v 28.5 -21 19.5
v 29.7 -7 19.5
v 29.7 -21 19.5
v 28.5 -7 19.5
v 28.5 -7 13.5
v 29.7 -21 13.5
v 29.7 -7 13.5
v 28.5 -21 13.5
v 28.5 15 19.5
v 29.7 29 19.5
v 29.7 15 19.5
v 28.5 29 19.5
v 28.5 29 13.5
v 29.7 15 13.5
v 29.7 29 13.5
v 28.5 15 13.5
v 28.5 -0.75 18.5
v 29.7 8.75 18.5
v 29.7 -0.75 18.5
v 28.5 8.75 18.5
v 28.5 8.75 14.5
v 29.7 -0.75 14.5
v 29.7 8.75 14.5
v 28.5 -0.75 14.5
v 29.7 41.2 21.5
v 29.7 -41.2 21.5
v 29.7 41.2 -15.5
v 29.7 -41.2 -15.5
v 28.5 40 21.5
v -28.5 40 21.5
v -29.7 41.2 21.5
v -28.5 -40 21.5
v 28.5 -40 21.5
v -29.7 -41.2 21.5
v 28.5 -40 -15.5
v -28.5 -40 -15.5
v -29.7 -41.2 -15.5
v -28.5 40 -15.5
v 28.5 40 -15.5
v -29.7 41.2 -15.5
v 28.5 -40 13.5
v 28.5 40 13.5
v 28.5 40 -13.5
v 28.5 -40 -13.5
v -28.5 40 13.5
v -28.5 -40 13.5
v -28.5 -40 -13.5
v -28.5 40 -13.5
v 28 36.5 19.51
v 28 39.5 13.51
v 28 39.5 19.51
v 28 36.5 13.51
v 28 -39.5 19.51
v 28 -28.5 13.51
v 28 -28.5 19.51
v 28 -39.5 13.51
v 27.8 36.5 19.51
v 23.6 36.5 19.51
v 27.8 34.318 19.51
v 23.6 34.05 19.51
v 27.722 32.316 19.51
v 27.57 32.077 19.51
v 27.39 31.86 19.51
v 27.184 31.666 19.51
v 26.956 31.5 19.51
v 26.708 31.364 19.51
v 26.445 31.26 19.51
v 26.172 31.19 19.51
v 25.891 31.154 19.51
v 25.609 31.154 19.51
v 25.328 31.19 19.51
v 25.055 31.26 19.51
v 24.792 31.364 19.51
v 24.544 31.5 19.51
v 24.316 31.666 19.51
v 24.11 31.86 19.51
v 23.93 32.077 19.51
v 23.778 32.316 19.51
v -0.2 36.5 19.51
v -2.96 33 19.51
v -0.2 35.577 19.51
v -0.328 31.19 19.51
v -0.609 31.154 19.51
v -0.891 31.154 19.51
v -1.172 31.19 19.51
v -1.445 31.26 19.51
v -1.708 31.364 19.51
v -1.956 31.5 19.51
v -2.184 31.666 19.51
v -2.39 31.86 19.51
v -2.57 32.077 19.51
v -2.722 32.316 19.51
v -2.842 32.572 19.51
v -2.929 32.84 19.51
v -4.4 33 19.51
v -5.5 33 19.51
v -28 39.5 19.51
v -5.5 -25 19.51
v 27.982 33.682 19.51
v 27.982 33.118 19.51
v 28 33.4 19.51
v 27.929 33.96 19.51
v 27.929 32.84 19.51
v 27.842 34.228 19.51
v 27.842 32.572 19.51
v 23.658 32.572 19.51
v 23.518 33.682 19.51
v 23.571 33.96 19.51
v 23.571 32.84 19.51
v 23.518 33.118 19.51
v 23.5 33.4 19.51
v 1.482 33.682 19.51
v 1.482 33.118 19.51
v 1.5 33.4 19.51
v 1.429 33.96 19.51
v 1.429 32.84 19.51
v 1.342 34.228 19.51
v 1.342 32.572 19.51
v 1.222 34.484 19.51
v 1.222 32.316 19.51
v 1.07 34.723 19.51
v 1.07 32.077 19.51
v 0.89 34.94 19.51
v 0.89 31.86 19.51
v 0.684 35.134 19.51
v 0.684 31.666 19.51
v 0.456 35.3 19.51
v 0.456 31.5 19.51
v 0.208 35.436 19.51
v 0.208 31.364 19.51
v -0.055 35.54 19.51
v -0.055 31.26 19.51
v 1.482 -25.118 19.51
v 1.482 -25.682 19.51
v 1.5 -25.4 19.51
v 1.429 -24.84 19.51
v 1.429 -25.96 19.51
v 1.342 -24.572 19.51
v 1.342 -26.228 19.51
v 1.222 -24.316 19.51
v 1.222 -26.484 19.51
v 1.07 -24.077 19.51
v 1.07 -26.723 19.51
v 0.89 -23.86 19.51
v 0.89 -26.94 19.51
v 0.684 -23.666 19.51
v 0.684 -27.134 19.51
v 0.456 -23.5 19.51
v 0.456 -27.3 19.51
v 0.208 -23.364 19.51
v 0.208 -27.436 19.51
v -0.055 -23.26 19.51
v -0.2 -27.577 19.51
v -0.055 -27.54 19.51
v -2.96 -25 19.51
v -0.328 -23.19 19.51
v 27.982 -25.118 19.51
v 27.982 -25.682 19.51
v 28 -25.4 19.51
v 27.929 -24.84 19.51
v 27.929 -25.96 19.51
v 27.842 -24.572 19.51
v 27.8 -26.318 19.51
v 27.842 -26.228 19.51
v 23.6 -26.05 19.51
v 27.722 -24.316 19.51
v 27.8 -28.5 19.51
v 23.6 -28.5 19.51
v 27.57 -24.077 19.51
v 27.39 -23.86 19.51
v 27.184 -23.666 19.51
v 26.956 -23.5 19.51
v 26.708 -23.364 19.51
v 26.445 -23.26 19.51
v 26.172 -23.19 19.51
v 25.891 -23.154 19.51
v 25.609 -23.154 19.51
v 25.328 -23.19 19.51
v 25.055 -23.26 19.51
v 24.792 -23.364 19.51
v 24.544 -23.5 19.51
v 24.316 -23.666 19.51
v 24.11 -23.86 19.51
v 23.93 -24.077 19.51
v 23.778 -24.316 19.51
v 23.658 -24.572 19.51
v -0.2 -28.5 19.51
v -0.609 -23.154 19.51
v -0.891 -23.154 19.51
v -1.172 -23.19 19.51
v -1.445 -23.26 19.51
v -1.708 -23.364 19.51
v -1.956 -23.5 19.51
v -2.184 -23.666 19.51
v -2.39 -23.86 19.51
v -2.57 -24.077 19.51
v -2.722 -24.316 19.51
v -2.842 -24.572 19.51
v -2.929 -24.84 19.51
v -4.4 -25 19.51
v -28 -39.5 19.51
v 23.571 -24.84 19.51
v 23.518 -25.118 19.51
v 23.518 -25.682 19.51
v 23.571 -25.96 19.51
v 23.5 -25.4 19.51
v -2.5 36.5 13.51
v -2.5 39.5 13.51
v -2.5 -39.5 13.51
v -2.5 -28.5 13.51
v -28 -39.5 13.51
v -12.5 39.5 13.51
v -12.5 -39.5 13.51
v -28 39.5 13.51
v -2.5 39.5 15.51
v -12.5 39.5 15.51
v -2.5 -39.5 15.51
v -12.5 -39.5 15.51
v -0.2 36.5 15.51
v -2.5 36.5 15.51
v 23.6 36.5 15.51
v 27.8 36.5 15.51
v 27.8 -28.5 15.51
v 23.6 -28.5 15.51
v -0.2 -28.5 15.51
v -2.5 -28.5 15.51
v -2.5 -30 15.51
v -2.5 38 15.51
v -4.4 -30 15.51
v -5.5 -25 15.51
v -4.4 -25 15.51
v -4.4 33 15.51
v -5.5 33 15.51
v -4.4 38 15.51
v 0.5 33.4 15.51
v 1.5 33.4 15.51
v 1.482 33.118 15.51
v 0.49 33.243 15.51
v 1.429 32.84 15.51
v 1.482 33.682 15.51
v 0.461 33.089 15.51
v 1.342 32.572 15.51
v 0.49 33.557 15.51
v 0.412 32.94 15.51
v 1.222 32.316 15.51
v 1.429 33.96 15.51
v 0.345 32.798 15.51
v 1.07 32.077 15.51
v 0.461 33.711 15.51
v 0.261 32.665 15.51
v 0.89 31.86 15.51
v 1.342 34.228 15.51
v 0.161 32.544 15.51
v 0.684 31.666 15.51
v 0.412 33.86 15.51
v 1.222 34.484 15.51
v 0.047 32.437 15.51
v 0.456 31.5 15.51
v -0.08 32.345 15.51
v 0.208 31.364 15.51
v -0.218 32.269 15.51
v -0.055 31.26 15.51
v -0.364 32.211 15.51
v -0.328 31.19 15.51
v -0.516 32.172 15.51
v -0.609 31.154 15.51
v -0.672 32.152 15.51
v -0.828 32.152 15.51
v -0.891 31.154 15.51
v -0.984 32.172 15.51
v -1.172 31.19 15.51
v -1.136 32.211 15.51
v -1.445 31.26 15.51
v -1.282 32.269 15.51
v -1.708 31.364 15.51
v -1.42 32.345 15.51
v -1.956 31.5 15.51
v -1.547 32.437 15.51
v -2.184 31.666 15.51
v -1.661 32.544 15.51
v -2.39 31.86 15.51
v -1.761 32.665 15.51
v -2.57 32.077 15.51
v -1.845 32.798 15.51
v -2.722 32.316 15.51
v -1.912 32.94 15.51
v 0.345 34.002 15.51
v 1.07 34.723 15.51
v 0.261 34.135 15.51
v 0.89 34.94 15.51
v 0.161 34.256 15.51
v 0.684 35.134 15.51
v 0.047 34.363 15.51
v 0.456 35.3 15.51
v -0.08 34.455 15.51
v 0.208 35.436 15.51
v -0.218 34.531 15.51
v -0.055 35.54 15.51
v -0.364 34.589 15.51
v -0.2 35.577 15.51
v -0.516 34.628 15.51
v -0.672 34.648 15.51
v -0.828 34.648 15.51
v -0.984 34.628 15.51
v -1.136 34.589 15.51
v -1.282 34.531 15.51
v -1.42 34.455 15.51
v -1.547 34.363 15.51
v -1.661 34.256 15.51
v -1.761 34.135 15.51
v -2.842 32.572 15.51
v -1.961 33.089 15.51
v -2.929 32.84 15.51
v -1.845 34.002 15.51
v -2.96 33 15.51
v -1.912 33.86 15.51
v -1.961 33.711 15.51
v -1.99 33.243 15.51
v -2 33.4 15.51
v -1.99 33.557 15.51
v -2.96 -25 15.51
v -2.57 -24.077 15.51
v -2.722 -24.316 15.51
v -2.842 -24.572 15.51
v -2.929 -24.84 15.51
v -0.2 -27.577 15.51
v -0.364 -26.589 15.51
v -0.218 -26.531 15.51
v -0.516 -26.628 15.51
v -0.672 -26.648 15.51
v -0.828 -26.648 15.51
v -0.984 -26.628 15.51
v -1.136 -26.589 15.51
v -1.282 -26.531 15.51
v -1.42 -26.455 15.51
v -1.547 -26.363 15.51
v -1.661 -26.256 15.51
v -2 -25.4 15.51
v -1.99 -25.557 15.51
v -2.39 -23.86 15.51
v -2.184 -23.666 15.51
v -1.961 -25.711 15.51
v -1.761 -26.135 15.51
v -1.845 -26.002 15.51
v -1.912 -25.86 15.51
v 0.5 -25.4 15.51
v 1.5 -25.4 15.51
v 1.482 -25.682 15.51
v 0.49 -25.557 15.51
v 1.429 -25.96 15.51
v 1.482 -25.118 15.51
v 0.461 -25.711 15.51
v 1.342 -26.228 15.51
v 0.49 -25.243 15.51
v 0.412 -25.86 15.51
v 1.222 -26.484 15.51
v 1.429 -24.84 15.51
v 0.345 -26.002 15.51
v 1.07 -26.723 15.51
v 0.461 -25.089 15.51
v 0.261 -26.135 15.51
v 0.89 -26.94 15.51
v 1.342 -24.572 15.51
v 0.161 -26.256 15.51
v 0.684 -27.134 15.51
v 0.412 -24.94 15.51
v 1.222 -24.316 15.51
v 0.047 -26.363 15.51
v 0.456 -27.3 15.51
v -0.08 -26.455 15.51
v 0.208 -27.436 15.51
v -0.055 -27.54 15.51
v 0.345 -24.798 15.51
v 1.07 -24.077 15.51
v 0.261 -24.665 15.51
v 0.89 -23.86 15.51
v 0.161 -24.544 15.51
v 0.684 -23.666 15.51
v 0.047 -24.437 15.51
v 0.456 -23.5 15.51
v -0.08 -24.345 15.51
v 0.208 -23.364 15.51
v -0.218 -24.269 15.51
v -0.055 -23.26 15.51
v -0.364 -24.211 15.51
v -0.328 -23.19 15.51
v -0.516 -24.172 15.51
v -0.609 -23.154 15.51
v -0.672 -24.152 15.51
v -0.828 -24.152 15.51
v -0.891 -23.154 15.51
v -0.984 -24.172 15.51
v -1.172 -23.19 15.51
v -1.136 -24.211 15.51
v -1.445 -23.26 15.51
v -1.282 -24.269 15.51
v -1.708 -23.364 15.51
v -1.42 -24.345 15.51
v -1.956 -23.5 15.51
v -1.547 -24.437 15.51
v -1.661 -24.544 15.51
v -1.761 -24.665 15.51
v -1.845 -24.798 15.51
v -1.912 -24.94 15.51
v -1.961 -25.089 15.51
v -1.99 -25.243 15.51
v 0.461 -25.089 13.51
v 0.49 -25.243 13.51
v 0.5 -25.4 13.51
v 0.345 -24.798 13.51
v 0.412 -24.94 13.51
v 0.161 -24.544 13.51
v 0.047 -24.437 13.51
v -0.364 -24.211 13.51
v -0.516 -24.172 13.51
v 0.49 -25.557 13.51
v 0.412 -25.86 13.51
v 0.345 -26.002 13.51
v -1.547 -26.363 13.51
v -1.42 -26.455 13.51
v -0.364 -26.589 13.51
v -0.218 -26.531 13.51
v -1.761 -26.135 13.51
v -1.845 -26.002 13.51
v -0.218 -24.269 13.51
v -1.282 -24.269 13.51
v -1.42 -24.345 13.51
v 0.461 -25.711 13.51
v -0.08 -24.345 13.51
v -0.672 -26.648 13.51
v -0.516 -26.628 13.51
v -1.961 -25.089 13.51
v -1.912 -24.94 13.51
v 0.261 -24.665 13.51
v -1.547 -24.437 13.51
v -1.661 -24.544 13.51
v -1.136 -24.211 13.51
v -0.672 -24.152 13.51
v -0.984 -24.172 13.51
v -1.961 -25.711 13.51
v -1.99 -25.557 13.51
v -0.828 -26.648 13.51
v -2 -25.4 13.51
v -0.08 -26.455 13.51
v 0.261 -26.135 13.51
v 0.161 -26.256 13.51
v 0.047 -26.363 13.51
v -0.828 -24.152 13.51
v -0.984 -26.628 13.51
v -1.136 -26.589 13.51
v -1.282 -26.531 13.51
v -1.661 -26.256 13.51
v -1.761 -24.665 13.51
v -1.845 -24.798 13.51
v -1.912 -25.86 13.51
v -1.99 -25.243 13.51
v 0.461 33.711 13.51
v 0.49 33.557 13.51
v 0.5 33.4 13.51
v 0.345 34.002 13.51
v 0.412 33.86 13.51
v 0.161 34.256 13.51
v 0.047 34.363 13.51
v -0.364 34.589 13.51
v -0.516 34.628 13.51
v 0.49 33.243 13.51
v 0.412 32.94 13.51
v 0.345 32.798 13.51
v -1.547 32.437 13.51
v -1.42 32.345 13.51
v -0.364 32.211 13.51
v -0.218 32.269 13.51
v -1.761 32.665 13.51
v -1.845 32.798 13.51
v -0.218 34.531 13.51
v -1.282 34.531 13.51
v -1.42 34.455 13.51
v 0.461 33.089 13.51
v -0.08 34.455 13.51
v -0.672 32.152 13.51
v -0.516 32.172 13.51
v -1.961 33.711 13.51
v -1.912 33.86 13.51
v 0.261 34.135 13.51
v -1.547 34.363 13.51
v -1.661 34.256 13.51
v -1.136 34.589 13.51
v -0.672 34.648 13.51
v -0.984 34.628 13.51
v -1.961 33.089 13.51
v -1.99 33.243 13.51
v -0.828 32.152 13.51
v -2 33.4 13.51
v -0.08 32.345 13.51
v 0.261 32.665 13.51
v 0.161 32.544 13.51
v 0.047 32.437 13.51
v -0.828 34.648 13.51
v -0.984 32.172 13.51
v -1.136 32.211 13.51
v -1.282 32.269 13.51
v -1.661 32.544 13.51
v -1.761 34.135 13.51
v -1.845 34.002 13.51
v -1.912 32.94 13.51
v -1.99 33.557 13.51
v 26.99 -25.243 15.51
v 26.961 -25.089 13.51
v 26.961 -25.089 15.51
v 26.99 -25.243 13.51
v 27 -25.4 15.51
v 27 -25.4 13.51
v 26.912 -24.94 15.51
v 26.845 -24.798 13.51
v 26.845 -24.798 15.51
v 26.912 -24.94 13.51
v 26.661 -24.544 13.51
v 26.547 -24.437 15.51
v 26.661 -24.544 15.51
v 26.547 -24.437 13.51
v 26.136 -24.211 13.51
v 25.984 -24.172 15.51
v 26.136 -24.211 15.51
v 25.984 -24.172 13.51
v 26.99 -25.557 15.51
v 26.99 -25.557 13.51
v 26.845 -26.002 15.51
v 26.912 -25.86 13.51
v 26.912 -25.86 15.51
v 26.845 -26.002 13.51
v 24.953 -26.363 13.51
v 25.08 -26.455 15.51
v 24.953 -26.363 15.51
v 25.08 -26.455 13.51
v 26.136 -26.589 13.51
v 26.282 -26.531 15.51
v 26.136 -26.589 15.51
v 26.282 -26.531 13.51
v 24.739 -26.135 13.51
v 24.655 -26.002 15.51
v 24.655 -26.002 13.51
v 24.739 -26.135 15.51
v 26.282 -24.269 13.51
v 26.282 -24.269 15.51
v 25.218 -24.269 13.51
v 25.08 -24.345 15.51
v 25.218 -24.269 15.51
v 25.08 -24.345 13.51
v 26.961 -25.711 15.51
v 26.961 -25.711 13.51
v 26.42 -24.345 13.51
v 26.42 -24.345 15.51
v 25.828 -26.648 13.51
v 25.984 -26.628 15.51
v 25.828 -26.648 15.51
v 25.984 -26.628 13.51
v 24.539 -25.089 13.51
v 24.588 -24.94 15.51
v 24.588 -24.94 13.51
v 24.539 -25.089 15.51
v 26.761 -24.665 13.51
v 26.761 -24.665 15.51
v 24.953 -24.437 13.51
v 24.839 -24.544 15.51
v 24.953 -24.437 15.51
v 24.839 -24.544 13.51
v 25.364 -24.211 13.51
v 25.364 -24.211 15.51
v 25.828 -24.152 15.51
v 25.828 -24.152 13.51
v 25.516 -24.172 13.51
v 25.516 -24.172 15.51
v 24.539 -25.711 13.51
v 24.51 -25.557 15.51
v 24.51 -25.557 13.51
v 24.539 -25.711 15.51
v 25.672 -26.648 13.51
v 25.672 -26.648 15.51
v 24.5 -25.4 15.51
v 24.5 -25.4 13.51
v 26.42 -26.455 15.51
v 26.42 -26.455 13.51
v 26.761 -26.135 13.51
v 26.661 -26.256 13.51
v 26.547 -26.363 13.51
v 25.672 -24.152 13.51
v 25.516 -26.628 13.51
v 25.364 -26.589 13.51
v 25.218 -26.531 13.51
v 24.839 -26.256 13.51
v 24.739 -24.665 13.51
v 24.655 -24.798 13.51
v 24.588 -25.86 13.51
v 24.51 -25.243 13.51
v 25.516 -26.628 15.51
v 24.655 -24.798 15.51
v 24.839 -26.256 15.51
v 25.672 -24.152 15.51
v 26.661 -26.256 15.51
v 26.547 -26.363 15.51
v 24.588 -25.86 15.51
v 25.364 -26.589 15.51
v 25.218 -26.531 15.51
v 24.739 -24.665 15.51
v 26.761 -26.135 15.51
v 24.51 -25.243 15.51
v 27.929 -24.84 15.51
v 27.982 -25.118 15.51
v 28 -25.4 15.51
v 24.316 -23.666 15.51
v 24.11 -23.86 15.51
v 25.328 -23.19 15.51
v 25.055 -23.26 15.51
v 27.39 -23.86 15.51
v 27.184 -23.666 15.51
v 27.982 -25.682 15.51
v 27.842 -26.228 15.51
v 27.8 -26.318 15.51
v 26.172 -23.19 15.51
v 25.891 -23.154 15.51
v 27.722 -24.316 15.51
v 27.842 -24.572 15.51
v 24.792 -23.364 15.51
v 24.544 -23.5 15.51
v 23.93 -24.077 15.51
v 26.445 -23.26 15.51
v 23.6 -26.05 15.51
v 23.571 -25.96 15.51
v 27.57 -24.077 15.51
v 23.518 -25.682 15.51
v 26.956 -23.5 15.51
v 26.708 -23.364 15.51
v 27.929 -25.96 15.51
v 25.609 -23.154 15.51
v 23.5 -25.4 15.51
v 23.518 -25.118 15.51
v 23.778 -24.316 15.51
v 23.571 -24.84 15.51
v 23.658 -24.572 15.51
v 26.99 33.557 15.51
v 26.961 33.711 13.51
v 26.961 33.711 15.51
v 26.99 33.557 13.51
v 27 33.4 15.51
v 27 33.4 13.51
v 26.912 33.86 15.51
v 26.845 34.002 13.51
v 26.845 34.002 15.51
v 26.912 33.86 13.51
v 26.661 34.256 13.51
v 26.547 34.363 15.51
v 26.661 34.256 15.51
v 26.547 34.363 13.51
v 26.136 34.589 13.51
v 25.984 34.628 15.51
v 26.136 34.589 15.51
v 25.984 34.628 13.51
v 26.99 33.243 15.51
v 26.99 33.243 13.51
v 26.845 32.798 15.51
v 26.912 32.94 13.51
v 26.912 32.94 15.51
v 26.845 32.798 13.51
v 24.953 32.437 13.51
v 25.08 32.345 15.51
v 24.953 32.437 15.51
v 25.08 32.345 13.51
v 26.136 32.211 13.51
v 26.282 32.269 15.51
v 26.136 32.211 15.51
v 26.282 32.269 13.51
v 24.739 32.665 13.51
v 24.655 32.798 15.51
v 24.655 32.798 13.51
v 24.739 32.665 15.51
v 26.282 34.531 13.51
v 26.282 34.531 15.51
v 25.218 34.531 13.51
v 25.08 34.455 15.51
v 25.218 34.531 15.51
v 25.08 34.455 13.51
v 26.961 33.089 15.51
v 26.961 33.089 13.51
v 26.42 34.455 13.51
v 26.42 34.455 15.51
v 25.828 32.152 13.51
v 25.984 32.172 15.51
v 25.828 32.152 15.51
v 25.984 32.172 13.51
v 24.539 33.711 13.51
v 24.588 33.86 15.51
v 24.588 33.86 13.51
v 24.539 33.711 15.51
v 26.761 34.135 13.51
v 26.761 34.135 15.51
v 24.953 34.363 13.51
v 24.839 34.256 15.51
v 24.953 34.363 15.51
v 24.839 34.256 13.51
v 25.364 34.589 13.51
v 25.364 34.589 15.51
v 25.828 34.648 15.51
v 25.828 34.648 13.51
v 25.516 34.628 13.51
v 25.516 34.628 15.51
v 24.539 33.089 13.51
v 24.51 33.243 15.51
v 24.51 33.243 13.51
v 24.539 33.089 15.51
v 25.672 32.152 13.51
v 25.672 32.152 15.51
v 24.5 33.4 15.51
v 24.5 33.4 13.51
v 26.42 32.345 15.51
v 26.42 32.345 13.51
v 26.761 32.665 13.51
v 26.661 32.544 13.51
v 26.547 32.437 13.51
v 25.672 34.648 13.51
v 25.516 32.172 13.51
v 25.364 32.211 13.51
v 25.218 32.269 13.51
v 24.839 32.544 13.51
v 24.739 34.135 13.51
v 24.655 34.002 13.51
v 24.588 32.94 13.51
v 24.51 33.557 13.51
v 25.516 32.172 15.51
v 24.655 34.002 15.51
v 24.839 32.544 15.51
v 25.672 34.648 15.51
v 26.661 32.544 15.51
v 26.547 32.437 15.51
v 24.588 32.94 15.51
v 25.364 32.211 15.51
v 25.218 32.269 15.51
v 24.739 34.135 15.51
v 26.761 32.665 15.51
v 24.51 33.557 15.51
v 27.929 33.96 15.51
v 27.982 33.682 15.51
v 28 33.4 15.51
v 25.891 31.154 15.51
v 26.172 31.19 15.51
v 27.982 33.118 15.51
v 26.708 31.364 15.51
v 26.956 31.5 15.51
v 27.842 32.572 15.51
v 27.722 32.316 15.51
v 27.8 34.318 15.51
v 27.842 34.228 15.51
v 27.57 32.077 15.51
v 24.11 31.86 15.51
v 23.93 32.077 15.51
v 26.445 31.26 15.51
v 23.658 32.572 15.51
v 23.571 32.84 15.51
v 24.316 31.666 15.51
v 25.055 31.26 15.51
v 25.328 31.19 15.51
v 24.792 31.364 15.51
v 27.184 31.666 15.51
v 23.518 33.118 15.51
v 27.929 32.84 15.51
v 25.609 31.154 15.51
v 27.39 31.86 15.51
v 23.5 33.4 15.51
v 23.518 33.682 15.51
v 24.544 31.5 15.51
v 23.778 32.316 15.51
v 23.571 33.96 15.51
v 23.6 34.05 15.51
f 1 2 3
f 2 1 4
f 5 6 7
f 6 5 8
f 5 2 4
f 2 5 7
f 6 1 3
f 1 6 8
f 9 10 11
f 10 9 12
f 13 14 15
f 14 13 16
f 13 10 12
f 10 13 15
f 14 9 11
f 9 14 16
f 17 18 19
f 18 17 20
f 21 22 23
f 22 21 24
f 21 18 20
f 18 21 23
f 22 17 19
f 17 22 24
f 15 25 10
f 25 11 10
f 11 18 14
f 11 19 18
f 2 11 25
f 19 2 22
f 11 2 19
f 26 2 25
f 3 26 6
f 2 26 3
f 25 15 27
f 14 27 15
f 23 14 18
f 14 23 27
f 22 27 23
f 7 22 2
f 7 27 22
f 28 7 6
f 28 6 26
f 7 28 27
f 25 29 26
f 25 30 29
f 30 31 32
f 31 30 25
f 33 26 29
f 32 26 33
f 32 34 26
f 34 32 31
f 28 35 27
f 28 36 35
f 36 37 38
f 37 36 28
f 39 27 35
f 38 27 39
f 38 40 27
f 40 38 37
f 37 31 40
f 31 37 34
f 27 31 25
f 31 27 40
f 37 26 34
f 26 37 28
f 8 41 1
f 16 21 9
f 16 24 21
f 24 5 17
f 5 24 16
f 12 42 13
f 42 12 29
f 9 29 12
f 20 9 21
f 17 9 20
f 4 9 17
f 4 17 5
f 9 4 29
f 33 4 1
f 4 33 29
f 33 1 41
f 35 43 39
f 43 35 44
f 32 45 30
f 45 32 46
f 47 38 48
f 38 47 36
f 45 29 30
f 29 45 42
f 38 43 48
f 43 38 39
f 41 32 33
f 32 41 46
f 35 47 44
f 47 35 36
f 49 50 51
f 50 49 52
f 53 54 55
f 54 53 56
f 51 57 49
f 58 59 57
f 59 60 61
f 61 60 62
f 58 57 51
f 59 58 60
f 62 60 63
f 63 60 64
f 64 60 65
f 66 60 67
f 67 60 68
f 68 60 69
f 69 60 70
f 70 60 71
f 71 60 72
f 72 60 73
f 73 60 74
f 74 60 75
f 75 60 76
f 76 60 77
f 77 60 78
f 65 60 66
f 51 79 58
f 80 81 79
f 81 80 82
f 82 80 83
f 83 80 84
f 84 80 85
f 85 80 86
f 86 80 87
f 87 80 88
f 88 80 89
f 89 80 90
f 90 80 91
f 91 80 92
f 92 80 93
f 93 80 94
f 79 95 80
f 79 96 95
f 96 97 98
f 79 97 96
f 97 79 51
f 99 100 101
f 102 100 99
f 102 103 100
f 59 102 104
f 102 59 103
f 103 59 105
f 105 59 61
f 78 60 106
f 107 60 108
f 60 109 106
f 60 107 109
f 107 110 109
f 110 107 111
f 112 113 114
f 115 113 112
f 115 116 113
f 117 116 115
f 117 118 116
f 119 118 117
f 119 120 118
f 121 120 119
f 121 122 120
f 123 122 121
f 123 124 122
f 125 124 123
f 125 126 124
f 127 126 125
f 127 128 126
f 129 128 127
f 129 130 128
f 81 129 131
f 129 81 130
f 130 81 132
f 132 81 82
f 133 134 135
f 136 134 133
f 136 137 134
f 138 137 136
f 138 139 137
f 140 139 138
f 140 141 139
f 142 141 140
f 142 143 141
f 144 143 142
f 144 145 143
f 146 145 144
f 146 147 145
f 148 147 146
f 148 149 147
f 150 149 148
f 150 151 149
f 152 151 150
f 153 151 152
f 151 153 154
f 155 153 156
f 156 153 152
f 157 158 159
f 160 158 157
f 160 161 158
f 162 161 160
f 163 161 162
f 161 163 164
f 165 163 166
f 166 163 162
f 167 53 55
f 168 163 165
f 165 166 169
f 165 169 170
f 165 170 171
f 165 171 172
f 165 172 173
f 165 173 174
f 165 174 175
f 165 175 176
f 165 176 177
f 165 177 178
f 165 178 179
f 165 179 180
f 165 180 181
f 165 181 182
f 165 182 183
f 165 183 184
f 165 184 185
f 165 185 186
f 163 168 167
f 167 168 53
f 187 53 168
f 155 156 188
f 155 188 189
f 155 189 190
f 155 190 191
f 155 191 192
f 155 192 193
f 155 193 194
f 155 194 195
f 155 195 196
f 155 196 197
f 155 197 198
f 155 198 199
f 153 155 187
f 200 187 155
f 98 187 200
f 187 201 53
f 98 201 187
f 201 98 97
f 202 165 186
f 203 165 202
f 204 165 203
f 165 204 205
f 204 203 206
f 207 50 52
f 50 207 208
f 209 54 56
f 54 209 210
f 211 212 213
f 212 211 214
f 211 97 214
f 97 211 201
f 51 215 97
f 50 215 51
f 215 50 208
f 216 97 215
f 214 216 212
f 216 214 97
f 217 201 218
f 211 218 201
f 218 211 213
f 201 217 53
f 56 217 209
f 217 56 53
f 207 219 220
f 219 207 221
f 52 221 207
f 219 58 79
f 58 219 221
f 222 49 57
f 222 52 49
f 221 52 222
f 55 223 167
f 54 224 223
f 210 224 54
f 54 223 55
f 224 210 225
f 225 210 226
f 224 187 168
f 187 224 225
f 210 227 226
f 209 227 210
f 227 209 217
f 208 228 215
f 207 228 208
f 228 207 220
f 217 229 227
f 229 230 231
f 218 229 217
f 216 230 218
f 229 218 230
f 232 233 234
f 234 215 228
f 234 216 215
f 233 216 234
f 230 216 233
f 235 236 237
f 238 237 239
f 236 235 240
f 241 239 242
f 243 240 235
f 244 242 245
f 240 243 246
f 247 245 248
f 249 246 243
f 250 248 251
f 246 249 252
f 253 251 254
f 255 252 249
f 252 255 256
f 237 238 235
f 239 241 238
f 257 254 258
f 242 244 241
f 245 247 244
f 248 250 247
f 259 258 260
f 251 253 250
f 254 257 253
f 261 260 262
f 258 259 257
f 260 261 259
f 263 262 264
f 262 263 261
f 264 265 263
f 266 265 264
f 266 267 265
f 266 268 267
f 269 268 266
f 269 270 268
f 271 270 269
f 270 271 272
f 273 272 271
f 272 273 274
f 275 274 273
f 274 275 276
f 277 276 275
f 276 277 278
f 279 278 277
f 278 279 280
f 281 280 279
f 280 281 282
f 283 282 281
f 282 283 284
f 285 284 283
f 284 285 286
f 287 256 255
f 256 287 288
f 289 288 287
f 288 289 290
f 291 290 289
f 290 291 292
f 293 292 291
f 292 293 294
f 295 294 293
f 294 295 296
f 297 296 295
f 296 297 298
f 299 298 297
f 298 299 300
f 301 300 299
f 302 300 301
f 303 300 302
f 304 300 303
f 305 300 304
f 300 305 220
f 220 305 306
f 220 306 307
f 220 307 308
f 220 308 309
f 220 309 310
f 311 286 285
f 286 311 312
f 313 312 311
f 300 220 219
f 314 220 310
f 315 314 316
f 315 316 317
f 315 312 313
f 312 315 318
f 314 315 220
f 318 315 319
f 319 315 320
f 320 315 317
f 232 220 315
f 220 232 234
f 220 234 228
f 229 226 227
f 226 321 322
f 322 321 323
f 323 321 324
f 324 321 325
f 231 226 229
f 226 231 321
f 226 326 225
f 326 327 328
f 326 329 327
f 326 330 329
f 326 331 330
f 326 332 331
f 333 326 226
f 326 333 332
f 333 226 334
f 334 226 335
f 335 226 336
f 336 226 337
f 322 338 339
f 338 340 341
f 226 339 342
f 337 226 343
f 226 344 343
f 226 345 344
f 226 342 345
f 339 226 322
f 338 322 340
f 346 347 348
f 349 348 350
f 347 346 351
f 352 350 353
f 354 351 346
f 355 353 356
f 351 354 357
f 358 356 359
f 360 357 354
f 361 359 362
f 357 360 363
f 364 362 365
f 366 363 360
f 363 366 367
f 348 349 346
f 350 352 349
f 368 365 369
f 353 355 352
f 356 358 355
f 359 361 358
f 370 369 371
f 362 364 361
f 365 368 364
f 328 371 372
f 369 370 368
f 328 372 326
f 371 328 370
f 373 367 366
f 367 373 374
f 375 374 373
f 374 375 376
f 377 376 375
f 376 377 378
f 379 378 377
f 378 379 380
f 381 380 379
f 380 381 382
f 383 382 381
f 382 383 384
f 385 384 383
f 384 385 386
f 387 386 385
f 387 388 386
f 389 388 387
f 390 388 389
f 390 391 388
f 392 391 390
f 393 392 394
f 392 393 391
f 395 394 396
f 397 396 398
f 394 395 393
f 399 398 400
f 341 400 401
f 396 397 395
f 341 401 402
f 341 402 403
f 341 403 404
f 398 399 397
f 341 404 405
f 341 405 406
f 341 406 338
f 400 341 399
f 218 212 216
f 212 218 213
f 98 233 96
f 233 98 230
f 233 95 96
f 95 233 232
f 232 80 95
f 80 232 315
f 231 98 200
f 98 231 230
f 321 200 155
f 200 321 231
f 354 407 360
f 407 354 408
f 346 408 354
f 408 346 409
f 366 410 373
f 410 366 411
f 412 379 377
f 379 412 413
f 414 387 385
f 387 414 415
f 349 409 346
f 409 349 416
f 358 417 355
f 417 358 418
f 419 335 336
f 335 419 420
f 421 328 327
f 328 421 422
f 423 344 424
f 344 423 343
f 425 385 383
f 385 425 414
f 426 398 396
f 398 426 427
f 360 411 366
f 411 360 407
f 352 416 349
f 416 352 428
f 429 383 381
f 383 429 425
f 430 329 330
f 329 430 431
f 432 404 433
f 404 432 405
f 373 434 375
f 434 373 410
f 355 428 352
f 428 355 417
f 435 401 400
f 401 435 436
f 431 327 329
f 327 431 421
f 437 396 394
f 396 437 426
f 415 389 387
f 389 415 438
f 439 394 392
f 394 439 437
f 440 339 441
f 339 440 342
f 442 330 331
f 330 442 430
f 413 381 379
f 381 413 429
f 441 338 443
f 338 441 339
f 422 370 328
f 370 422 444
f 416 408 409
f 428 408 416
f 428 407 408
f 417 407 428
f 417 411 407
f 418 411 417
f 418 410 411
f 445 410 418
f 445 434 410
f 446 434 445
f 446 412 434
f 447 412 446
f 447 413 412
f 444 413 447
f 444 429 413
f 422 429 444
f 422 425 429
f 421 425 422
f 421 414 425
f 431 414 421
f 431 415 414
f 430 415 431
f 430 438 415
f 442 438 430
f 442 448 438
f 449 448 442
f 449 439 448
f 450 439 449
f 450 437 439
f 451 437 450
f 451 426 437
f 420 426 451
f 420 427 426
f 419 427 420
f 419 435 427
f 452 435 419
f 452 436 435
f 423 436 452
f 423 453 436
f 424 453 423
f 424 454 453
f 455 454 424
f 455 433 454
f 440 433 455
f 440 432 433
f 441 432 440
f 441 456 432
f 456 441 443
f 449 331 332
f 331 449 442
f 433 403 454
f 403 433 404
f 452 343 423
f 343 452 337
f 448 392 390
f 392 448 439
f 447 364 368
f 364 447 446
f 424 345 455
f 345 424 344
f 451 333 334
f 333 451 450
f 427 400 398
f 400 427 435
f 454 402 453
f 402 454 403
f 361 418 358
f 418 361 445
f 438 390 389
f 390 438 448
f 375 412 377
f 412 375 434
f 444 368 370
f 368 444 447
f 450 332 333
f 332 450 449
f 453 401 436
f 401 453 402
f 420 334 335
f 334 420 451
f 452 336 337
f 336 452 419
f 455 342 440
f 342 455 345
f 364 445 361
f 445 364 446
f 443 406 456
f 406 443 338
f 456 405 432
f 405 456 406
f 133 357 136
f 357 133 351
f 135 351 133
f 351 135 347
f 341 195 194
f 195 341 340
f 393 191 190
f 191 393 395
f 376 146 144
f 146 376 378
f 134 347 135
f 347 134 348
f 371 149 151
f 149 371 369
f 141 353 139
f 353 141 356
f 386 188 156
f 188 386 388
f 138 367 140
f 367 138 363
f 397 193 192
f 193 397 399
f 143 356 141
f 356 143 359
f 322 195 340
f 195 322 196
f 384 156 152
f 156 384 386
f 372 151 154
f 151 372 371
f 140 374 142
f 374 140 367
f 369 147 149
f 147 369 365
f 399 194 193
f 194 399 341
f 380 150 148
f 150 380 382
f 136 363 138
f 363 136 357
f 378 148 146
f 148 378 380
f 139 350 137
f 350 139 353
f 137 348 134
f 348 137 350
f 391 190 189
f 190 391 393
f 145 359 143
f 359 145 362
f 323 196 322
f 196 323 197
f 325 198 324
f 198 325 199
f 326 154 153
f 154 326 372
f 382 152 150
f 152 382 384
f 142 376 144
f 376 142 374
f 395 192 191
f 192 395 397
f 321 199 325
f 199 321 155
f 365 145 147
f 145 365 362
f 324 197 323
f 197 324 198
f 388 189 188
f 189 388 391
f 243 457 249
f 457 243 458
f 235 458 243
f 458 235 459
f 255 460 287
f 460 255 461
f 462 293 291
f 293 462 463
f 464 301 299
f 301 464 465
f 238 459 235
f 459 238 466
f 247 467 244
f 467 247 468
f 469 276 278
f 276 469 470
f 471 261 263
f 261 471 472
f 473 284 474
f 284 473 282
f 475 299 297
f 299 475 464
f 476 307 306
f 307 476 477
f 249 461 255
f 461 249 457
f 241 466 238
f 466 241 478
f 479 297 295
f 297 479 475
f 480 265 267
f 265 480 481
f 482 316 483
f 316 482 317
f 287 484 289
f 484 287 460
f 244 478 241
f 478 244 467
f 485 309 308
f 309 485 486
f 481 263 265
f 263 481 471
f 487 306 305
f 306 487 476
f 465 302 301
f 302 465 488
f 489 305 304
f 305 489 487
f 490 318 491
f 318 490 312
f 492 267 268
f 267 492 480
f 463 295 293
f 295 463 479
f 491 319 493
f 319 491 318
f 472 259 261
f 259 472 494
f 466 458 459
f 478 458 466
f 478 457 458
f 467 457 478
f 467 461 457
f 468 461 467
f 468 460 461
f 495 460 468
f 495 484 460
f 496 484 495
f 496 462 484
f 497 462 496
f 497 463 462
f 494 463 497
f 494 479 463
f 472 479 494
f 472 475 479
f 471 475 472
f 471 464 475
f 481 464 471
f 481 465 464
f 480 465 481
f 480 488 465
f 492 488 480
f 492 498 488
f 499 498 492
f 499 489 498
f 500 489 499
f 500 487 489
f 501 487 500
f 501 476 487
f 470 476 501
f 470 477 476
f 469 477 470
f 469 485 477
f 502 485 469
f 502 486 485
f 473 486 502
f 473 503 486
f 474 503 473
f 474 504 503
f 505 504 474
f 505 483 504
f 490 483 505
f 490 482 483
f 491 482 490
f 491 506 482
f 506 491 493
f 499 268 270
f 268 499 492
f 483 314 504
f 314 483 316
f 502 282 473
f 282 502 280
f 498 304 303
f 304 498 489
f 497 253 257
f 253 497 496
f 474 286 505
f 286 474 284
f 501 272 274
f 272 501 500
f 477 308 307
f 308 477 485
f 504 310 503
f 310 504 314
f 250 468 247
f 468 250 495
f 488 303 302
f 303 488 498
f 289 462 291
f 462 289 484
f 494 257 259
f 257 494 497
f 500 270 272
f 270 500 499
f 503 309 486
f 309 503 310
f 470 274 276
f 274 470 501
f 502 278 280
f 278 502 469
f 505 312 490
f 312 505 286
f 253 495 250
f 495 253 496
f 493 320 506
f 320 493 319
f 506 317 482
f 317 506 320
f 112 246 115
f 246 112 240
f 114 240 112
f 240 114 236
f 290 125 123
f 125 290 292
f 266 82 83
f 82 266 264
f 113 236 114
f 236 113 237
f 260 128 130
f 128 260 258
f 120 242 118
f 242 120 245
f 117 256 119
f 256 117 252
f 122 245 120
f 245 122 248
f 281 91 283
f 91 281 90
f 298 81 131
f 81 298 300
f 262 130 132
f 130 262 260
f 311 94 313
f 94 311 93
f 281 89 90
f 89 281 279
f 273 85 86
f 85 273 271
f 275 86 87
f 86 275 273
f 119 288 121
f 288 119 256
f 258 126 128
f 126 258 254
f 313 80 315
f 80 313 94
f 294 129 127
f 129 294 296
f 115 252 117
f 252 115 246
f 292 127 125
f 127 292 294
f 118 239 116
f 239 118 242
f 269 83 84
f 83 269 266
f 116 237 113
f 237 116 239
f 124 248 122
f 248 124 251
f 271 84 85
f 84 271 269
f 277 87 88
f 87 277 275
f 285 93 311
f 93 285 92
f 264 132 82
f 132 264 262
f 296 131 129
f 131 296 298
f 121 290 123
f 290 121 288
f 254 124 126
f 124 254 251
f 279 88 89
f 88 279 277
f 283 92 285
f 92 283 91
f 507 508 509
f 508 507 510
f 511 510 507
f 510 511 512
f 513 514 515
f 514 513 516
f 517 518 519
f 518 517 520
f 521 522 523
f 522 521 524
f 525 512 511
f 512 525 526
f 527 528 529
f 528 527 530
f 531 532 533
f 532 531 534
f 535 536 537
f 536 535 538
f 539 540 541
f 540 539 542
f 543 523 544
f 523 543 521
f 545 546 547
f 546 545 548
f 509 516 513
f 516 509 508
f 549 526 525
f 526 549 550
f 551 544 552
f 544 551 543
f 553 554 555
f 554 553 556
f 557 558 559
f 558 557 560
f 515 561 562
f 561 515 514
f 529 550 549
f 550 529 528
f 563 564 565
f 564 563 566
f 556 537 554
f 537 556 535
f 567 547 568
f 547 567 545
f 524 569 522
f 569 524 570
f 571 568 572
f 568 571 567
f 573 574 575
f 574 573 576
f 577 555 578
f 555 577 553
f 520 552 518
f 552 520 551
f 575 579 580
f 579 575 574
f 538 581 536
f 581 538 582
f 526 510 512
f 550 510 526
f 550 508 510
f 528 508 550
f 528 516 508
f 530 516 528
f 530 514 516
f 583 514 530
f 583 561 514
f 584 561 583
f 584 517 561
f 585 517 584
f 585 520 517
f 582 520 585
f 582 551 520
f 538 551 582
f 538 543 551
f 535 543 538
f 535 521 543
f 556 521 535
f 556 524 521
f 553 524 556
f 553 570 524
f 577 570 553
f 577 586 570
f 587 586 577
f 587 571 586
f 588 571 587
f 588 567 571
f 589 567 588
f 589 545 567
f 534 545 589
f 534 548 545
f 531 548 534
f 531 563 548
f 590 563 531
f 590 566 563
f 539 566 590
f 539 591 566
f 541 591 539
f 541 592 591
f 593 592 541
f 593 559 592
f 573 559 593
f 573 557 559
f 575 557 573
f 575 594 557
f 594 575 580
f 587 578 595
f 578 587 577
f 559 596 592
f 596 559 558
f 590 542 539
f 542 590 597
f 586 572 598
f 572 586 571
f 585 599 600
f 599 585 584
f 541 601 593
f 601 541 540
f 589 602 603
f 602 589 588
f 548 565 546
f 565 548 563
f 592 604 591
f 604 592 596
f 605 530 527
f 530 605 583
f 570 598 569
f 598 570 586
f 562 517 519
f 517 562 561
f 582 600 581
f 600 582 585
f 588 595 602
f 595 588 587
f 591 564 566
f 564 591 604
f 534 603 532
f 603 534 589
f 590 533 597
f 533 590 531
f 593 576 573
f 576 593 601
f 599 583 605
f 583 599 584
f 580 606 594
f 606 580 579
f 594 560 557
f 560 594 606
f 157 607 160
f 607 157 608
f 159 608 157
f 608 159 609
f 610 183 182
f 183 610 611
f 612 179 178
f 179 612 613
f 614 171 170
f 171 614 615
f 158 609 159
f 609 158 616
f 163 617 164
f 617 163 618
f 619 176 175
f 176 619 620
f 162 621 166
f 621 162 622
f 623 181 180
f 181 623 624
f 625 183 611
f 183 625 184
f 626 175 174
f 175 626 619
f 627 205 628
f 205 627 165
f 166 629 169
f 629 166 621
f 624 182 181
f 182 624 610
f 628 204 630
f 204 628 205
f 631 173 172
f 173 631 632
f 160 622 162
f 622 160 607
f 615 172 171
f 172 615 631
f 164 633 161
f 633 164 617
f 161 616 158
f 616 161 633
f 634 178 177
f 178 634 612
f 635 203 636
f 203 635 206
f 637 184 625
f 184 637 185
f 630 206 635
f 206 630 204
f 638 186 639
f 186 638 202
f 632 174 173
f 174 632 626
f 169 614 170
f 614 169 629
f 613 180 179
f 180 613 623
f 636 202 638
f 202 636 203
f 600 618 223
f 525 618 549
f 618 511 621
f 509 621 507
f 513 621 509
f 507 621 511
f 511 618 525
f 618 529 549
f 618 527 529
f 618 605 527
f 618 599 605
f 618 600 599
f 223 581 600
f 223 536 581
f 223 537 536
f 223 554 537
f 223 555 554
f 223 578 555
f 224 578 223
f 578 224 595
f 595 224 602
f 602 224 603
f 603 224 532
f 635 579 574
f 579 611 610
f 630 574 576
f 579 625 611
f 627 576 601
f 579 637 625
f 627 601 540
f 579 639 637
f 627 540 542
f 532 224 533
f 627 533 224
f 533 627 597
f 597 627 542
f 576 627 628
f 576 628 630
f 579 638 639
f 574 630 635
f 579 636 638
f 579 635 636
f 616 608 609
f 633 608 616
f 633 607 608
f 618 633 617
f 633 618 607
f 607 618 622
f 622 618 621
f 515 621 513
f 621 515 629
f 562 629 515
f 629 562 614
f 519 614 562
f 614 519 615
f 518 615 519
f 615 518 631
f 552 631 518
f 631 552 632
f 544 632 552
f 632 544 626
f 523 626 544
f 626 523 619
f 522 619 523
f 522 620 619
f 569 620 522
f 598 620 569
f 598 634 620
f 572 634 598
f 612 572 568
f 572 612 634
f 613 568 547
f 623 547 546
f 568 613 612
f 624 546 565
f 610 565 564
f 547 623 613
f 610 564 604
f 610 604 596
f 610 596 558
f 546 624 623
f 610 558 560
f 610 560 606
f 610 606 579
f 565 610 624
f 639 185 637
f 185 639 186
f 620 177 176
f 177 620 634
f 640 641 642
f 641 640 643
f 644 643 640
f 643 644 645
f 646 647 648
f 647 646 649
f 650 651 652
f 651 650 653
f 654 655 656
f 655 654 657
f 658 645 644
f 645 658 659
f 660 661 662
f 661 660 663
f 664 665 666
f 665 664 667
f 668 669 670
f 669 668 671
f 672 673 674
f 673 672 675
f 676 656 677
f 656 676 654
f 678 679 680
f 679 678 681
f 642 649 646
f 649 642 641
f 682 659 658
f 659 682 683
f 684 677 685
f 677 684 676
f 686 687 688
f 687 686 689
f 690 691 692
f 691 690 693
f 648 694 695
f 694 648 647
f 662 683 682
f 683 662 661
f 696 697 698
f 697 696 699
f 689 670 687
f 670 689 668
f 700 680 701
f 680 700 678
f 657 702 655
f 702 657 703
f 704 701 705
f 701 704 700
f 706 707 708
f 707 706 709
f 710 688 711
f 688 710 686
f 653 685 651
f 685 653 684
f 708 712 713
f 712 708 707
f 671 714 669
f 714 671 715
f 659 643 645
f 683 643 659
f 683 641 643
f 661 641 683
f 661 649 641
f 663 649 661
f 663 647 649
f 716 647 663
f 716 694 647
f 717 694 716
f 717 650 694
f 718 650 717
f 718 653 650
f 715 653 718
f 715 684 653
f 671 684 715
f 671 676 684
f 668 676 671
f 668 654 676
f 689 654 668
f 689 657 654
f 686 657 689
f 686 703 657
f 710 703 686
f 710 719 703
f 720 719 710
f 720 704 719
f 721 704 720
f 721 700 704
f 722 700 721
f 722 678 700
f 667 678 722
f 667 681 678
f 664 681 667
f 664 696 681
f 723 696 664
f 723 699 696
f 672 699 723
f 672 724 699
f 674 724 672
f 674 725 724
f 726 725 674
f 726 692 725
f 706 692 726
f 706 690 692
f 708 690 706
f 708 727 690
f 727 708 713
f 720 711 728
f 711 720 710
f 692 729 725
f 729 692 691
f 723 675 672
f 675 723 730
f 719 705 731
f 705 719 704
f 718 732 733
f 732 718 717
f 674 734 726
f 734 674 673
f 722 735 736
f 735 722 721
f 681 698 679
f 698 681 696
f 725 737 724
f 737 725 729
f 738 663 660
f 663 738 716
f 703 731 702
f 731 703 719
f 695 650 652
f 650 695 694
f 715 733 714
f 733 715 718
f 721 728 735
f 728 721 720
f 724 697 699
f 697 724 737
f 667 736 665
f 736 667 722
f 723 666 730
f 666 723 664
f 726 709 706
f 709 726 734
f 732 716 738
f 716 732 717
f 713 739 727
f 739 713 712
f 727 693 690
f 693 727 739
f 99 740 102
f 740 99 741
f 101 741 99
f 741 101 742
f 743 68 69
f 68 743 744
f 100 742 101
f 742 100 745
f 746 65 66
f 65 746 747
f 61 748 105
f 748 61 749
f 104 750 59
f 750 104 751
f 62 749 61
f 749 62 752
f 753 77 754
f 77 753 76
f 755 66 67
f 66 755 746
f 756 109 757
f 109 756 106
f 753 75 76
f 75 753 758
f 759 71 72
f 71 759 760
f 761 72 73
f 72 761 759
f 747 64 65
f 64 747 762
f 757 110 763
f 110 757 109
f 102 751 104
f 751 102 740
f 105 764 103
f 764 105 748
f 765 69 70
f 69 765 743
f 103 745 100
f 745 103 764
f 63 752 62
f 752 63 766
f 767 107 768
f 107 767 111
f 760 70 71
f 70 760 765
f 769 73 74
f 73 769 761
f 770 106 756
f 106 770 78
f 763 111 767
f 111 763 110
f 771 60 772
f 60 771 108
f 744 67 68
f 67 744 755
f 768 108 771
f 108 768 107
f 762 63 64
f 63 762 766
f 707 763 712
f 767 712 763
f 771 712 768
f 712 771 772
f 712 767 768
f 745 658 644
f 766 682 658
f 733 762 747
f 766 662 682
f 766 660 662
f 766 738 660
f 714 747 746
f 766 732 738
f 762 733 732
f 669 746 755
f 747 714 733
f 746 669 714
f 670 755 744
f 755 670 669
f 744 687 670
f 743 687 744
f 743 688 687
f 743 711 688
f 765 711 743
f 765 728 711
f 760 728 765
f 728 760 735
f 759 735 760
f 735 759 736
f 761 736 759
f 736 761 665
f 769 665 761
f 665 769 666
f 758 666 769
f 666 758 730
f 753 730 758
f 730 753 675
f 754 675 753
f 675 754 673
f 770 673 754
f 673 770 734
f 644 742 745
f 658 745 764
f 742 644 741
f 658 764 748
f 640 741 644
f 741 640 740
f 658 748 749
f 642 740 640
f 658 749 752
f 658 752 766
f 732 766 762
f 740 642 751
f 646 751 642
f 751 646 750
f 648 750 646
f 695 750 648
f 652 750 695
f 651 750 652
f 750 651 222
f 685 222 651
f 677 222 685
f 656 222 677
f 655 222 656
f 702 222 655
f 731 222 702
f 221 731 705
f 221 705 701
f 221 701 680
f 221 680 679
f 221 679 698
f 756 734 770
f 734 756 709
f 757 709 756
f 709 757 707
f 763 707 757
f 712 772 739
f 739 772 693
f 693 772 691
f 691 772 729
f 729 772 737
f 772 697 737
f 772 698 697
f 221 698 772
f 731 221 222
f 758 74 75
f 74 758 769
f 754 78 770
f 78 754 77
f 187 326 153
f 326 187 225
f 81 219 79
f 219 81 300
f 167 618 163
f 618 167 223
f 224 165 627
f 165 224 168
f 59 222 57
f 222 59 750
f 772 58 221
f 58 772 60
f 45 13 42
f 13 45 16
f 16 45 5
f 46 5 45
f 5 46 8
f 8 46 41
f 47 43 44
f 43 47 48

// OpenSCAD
$fn=50;

w_batt = 57;
h_batt = 80;
t_batt = 27;

// Make it a multiple of nozzle size
t_wall = 1.2;

h_lid = 6;

// thickness of the top and bottom denim-lined plates
h_plates = 2;


module corners(w=10, h=5) {
    for (i = [-1, 1])
        for (j = [-1, 1])
            translate([w / 2 * i, h / 2 * j, 0]) children(0);
}


module batt() {
    // color("green") {
    //     translate([12.0, 4, t_batt / 2 + 3])
    //         cube(size=[32.5, 65, 6], center=true);
    // }
    color("grey")
        cube(size=[w_batt, h_batt, t_batt], center=true);
}


module box() {
    h_box = t_batt + h_lid + 2 * h_plates;
    translate([0, 0, h_lid / 2])
        difference() {
            // outer dimensions of box
            cube(size=[w_batt + 2 * t_wall, h_batt + 2 * t_wall, h_box], center=true);
            // inner dimensions of box
            cube(size=[w_batt, h_batt, h_box + 1], center=true);
            // bottom notch for lid
            // translate([0, 0, (t_wall - h_box - 0.01) / 2])
            //     cube(size=[w_batt + t_wall, h_batt + t_wall, t_wall], center=true);
            // USB holes
            translate([w_batt / 2, 4, 10.5])
                usb_holes();

        }
}


module usb_holes() {
    // cut 2 big USB holes
    for (i = [-1, 1])
        translate([0, i * 18, 3])
            cube(size=[10, 14, 6], center=true);

    // cut middle USB hole
    translate([0, 0, 3])
        cube(size=[10, 9.5, 4], center=true);
}


module pcb_holder(){
    dx = 12.5;
    dy = 4;
    difference() {
        cube(size=[w_batt - 1, h_batt - 1, h_lid], center=true);

        // cavity for PCB
        translate([dx, dy, 0])
            cube(size=[33, 65, 10], center=true);

        translate([dx - 5 - 15, dy, -3 - h_lid / 2])
            cube(size=[10, 100, 10], center=true);

        translate([dx - 16.5, dy, 0])
            cube(size=[3, 58, 10], center=true);
    }

    // pins + spacer
    translate([dx, dy, 0]) {
        corners(26.5, 58.8)
            union() {
                cylinder(d=2.5, h=h_lid, center=true);
                translate([0, 0, 1])
                    cylinder(d=4.5, h=h_lid - 2, center=true);
            }
        // cubes to connect pins to frame
        translate([-0.8, 0, 1])
            corners(28, 63)
                cube(size=[4.2, 5, h_lid - 2], center=true);
    }
}


batt();
box();

color("blue")
    translate([0, 0, h_lid / 2 + t_batt / 2 + 0.01])
        pcb_holder();
